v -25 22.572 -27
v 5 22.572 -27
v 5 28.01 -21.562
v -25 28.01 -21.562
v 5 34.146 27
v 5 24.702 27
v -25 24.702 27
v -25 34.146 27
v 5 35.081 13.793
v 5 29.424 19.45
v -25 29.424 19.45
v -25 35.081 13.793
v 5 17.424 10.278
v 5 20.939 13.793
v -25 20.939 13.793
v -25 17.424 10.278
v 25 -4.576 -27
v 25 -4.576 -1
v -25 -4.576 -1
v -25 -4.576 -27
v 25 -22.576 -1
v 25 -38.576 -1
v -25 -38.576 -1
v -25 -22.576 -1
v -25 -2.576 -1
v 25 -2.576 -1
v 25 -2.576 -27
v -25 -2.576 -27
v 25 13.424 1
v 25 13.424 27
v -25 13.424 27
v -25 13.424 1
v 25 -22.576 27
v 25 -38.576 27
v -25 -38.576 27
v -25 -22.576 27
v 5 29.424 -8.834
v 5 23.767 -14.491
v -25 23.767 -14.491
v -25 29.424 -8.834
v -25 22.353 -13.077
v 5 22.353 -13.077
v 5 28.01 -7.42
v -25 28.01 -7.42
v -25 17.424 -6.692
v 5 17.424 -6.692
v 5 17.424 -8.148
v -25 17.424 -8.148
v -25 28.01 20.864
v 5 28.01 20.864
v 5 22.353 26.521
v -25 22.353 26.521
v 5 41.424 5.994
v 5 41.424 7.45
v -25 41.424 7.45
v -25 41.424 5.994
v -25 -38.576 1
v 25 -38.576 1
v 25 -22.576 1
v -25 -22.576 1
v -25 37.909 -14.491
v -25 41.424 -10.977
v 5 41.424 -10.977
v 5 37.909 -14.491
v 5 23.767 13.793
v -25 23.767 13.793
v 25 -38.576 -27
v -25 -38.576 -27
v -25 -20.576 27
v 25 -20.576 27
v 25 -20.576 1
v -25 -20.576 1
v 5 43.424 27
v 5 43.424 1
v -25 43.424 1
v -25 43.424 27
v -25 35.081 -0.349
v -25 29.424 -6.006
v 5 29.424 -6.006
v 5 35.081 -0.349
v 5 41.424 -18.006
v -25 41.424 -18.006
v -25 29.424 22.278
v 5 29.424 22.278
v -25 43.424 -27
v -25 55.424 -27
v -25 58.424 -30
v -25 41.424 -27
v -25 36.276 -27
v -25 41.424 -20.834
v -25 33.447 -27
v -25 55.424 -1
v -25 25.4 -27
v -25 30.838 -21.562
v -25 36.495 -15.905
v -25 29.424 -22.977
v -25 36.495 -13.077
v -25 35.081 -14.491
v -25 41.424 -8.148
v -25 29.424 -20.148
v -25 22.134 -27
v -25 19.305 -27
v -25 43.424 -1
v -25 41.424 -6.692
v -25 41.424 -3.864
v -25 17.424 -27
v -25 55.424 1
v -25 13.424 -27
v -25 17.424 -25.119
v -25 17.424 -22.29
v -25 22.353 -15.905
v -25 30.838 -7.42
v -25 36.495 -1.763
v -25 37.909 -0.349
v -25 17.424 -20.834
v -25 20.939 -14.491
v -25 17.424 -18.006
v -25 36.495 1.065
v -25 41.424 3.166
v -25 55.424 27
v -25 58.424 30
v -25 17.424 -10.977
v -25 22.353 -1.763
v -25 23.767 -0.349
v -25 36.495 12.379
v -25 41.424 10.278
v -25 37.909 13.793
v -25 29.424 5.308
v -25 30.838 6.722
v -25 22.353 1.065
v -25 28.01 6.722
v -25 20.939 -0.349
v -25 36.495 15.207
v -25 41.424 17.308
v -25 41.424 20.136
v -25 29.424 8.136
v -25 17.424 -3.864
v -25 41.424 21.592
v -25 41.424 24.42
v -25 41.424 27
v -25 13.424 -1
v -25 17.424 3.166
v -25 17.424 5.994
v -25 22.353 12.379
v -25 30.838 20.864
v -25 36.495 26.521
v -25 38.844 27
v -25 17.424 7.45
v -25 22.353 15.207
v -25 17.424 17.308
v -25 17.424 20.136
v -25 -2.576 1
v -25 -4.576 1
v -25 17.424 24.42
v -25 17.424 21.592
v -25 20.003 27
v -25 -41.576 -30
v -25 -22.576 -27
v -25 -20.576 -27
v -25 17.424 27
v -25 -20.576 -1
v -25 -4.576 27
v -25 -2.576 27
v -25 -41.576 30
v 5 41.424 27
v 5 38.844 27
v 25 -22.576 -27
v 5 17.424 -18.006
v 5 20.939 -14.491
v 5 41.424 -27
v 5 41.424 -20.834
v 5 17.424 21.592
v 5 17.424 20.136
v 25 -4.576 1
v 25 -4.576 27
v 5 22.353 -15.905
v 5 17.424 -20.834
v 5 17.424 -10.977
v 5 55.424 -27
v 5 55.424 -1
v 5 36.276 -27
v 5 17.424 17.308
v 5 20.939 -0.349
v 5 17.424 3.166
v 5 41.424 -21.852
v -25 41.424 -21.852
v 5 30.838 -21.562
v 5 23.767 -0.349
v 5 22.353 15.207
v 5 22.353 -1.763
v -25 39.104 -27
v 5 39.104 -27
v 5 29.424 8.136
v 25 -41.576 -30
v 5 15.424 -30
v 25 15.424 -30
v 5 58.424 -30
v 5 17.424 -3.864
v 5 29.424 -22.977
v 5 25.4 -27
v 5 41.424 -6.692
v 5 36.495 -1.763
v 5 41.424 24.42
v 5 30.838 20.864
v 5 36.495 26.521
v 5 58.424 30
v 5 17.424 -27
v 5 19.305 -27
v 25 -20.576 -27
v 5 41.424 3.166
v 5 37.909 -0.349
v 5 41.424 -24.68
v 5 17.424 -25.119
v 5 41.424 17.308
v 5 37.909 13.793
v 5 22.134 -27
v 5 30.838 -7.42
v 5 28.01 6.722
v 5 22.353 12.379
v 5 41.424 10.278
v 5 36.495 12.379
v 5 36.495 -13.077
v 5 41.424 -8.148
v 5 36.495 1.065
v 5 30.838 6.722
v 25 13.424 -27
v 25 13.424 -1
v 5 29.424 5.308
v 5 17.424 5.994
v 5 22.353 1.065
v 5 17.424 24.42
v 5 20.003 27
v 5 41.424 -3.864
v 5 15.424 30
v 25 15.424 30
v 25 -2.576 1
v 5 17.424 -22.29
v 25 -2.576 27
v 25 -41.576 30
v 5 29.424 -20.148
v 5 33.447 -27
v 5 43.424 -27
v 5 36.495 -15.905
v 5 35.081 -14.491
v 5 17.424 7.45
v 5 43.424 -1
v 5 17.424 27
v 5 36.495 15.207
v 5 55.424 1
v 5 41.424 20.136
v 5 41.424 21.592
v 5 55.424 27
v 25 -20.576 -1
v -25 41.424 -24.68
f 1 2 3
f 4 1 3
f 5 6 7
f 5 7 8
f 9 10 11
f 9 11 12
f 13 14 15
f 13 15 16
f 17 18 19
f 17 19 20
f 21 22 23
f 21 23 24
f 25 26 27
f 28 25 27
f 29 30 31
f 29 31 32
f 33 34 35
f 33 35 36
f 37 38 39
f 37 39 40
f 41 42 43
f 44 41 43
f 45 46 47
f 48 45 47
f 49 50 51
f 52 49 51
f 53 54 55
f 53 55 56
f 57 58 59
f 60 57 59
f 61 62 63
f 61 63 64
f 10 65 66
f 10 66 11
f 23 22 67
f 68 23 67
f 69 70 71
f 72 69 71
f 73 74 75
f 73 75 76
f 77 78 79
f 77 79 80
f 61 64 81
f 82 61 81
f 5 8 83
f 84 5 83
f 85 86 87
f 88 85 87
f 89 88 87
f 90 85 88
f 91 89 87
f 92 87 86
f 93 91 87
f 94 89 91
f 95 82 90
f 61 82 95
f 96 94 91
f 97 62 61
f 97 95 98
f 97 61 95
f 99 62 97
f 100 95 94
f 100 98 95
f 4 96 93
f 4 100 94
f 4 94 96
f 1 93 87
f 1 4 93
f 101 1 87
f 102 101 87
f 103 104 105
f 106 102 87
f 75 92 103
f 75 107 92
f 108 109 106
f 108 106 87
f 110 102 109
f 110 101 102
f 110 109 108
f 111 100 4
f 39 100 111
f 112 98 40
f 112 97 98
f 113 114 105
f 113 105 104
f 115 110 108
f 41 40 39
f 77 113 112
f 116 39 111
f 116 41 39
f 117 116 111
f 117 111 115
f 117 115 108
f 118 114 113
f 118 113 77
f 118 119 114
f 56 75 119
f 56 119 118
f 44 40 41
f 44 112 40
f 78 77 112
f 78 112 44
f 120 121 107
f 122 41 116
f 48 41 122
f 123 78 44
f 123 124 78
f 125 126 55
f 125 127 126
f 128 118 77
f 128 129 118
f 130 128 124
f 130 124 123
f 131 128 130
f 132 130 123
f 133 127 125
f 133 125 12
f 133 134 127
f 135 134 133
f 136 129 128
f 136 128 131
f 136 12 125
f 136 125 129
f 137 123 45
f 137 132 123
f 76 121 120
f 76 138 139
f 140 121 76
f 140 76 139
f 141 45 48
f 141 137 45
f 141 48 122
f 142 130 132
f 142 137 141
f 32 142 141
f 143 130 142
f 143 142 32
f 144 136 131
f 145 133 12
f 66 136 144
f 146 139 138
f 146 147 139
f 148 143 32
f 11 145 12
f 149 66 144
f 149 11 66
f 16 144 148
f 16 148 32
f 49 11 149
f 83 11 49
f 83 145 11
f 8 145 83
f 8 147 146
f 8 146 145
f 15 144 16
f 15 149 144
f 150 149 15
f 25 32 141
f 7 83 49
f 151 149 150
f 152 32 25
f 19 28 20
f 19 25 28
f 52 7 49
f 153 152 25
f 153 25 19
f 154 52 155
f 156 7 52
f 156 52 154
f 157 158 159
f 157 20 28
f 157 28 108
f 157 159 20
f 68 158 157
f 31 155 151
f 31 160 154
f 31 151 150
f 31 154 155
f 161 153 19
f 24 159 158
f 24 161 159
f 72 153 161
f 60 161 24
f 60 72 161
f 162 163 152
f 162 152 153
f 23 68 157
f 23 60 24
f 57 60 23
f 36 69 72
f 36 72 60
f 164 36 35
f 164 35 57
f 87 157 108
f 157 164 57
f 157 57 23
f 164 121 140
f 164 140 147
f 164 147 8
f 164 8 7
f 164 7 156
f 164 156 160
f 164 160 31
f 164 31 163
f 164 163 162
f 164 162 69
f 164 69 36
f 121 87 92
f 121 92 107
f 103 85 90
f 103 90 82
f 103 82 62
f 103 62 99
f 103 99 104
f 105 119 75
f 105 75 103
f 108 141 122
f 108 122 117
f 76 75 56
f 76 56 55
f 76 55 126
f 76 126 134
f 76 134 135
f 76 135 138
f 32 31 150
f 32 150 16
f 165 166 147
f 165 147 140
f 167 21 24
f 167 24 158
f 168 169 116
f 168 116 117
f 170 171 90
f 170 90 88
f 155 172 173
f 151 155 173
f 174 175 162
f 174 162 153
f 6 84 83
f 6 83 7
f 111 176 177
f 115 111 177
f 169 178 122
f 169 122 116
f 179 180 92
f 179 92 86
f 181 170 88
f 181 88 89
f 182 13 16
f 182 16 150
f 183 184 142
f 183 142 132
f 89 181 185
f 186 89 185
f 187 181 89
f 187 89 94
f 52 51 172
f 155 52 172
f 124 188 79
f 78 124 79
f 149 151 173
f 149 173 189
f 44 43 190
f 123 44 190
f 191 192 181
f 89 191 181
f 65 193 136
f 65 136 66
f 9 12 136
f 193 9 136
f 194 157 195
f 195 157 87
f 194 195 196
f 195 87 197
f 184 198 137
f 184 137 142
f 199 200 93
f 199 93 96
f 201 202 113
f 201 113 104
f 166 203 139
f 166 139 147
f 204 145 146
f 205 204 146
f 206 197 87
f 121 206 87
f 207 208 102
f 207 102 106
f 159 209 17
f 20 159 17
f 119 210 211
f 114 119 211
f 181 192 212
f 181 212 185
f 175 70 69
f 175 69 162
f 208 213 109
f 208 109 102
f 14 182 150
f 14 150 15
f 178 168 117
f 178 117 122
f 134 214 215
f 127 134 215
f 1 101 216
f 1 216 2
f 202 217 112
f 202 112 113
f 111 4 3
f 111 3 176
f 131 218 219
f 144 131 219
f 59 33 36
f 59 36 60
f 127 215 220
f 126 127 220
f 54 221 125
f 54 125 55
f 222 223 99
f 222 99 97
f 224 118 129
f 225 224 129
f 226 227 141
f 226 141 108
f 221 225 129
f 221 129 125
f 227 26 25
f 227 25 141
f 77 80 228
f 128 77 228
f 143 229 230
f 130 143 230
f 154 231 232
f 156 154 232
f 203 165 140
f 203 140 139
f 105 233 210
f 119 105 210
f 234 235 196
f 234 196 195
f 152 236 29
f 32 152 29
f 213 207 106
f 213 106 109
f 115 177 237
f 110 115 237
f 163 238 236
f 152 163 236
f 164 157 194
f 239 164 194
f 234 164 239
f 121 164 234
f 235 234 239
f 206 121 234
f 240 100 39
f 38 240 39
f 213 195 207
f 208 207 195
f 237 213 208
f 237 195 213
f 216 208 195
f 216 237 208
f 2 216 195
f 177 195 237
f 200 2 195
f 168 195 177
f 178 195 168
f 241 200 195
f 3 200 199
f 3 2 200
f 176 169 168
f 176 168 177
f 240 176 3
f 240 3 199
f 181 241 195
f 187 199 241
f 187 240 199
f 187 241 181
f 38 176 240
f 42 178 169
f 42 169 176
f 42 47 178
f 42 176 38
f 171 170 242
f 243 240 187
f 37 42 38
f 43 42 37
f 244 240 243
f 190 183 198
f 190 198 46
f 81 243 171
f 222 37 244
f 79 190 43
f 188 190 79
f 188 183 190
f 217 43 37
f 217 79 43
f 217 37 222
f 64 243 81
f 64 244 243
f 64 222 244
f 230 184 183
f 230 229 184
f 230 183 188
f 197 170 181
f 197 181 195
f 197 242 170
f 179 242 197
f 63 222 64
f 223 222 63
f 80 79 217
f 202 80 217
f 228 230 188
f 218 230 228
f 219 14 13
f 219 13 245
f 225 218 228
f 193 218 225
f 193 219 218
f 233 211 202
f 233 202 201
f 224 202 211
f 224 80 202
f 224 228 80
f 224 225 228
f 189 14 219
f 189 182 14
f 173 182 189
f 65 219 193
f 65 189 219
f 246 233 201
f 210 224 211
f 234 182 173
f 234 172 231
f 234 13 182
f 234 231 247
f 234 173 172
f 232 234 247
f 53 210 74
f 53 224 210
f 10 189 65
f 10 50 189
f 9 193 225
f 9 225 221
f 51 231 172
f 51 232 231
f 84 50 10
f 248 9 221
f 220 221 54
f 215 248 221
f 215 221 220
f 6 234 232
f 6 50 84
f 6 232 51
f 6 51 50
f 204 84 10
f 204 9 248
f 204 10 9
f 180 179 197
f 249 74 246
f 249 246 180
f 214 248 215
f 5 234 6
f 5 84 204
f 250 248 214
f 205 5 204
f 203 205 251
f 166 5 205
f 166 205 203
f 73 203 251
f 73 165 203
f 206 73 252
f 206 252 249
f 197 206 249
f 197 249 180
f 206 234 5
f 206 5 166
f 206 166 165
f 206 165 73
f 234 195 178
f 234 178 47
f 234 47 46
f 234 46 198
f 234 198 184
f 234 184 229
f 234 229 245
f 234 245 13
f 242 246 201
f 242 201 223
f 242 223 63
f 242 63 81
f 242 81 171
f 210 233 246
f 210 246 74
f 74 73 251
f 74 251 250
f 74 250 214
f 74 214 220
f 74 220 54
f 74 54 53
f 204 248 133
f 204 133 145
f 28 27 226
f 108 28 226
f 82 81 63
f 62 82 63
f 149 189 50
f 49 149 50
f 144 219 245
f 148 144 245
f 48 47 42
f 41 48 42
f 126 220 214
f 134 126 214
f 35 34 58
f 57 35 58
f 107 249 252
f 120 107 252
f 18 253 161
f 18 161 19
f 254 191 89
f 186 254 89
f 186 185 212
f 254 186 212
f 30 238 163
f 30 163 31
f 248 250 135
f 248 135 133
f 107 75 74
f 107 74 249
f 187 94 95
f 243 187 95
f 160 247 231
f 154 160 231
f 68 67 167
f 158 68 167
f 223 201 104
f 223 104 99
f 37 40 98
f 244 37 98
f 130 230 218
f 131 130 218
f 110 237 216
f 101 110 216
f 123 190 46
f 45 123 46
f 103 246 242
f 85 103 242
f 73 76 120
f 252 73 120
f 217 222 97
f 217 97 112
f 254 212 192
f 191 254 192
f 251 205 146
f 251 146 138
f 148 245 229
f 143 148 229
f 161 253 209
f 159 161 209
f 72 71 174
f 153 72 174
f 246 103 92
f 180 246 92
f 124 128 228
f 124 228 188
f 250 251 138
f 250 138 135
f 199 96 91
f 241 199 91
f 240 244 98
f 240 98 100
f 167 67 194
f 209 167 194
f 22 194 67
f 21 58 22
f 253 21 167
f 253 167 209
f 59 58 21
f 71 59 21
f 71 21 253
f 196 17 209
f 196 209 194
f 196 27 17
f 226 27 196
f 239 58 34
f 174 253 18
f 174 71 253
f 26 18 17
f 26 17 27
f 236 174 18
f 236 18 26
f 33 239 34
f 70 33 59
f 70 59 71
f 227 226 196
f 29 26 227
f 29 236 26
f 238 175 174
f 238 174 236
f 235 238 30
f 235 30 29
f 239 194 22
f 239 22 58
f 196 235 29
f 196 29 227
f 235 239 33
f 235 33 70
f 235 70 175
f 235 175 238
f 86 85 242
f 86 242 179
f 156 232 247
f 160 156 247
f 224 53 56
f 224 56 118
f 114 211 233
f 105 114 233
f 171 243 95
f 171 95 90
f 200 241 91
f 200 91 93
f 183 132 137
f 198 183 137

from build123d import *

# Parameters (mm, degrees)
BOSS_EXTRUDE1_DEPTH = 30
SKETCH2_W           = 26
SKETCH2_H           = 16
CUT_EXTRUDE1_DEPTH  = 83.543040987
SKETCH3_W           = 26
SKETCH3_H           = 12
CUT_EXTRUDE2_DEPTH  = 73.203556805
CUT_EXTRUDE3_DEPTH  = 73.203556805
BOSS_EXTRUDE2_DEPTH = 30


with BuildPart() as part:
    # Sketch1 → Boss-Extrude1 (new, symmetric)
    with BuildSketch(Plane.XY):
        Polygon((-25, 58.423913043), (-25, -41.576086957), (25, -41.576086957), (25, 15.423913043), (5, 15.423913043), (5, 58.423913043), align=None)
    extrude(amount=BOSS_EXTRUDE1_DEPTH, both=True)

    # Sketch2 → Cut-Extrude1 (cut, through all)
    with BuildSketch(Plane(origin=(25, 0, 0), x_dir=(0, 0, -1), z_dir=(1, 0, 0))):
        with Locations((-14, 5.423913043)):
            Rectangle(SKETCH2_W, SKETCH2_H)
        with Locations((14, 5.423913043)):
            Rectangle(SKETCH2_W, SKETCH2_H)
        with Locations((-14, -12.576086957)):
            Rectangle(SKETCH2_W, SKETCH2_H)
        with Locations((14, -12.576086957)):
            Rectangle(SKETCH2_W, SKETCH2_H)
        with Locations((14, -30.576086957)):
            Rectangle(SKETCH2_W, SKETCH2_H)
        with Locations((-14, -30.576086957)):
            Rectangle(SKETCH2_W, SKETCH2_H)
    extrude(amount=-CUT_EXTRUDE1_DEPTH, mode=Mode.SUBTRACT)

    # Sketch3 → Cut-Extrude2 (cut, through all)
    with BuildSketch(Plane(origin=(5, 0, 0), x_dir=(0, 0, -1), z_dir=(1, 0, 0))):
        with Locations((14, 49.423913043)):
            Rectangle(SKETCH3_W, SKETCH3_H)
    cut_extrude2 = extrude(amount=-CUT_EXTRUDE2_DEPTH, mode=Mode.SUBTRACT)

    # Mirror2: Cut-Extrude2 across plane
    add(cut_extrude2.mirror(Plane.XY), mode=Mode.SUBTRACT)

    # Sketch4 → Cut-Extrude3 (cut, through all)
    with BuildSketch(Plane(origin=(5, 0, 0), x_dir=(0, 0, -1), z_dir=(1, 0, 0))):
        Polygon((-27, 41.423913043), (-24.420447792, 41.423913043), (-27, 38.844360836), align=None)
        Polygon((-27, 17.423913043), (-24.420447792, 17.423913043), (-27, 20.003465251), align=None)
        Polygon((27, 41.423913043), (27, 36.275818341), (21.562308265, 30.838126606), (15.905454016, 36.494980855), (20.834386204, 41.423913043), align=None)
        Polygon((-26.520952855, 22.352845232), (-21.592020667, 17.423913043), (-20.136176545, 17.423913043), (-15.207244356, 22.352845232), (-20.864098606, 28.009699481), align=None)
        Polygon((-20.136176545, 41.423913043), (-15.207244356, 36.494980855), (-20.864098606, 30.838126606), (-26.520952855, 36.494980855), (-21.592020667, 41.423913043), align=None)
        Polygon((-17.30774942, 41.423913043), (-13.793030794, 37.909194418), (-10.278312168, 41.423913043), align=None)
        Polygon((-27, 34.145600875), (-22.278312168, 29.423913043), (-27, 24.702225212), align=None)
        Polygon((-5.994040921, 41.423913043), (-1.065108733, 36.494980855), (-6.721962982, 30.838126606), (-12.378817232, 36.494980855), (-7.449885044, 41.423913043), align=None)
        Polygon((-3.165613796, 41.423913043), (0.34910483, 37.909194418), (3.863823455, 41.423913043), align=None)
        Polygon((8.148094703, 41.423913043), (13.077026891, 36.494980855), (7.420172641, 30.838126606), (1.763318392, 36.494980855), (6.69225058, 41.423913043), align=None)
        Polygon((10.976521828, 41.423913043), (14.491240453, 37.909194418), (18.005959079, 41.423913043), align=None)
        Polygon((-5.994040921, 17.423913043), (-1.065108733, 22.352845232), (-6.721962982, 28.009699481), (-12.378817232, 22.352845232), (-7.449885044, 17.423913043), align=None)
        Polygon((-17.30774942, 17.423913043), (-13.793030794, 20.938631669), (-10.278312168, 17.423913043), align=None)
        Polygon((-3.165613796, 17.423913043), (0.34910483, 20.938631669), (3.863823455, 17.423913043), align=None)
        Polygon((8.148094703, 17.423913043), (13.077026891, 22.352845232), (7.420172641, 28.009699481), (1.763318392, 22.352845232), (6.69225058, 17.423913043), align=None)
        Polygon((10.976521828, 17.423913043), (14.491240453, 20.938631669), (18.005959079, 17.423913043), align=None)
        Polygon((25.118657451, 17.423913043), (27, 19.305255592), (27, 17.423913043), align=None)
        Polygon((22.290230327, 17.423913043), (27, 22.133682717), (27, 22.572007746), (21.562308265, 28.009699481), (15.905454016, 22.352845232), (20.834386204, 17.423913043), align=None)
        Polygon((-13.793030794, 35.080767293), (-8.136176545, 29.423913043), (-13.793030794, 23.767058794), (-19.449885044, 29.423913043), align=None)
        Polygon((-5.30774942, 29.423913043), (0.34910483, 23.767058794), (6.005959079, 29.423913043), (0.34910483, 35.080767293), align=None)
        Polygon((22.976521828, 29.423913043), (27, 33.447391216), (27, 25.400434871), align=None)
        Polygon((14.491240453, 35.080767293), (20.148094703, 29.423913043), (14.491240453, 23.767058794), (8.834386204, 29.423913043), align=None)
    extrude(amount=-CUT_EXTRUDE3_DEPTH, mode=Mode.SUBTRACT)


with BuildPart() as body_2:
    # Sketch5 → Boss-Extrude2 (new, through all)
    with BuildSketch(Plane(origin=(5, 0, 0), x_dir=(0, 0, -1), z_dir=(1, 0, 0))):
        Polygon((27, 36.275818341), (21.851905297, 41.423913043), (24.680332422, 41.423913043), (27, 39.104245465), align=None)
    extrude(amount=-BOSS_EXTRUDE2_DEPTH)


solid = Compound([part.part, body_2.part])
